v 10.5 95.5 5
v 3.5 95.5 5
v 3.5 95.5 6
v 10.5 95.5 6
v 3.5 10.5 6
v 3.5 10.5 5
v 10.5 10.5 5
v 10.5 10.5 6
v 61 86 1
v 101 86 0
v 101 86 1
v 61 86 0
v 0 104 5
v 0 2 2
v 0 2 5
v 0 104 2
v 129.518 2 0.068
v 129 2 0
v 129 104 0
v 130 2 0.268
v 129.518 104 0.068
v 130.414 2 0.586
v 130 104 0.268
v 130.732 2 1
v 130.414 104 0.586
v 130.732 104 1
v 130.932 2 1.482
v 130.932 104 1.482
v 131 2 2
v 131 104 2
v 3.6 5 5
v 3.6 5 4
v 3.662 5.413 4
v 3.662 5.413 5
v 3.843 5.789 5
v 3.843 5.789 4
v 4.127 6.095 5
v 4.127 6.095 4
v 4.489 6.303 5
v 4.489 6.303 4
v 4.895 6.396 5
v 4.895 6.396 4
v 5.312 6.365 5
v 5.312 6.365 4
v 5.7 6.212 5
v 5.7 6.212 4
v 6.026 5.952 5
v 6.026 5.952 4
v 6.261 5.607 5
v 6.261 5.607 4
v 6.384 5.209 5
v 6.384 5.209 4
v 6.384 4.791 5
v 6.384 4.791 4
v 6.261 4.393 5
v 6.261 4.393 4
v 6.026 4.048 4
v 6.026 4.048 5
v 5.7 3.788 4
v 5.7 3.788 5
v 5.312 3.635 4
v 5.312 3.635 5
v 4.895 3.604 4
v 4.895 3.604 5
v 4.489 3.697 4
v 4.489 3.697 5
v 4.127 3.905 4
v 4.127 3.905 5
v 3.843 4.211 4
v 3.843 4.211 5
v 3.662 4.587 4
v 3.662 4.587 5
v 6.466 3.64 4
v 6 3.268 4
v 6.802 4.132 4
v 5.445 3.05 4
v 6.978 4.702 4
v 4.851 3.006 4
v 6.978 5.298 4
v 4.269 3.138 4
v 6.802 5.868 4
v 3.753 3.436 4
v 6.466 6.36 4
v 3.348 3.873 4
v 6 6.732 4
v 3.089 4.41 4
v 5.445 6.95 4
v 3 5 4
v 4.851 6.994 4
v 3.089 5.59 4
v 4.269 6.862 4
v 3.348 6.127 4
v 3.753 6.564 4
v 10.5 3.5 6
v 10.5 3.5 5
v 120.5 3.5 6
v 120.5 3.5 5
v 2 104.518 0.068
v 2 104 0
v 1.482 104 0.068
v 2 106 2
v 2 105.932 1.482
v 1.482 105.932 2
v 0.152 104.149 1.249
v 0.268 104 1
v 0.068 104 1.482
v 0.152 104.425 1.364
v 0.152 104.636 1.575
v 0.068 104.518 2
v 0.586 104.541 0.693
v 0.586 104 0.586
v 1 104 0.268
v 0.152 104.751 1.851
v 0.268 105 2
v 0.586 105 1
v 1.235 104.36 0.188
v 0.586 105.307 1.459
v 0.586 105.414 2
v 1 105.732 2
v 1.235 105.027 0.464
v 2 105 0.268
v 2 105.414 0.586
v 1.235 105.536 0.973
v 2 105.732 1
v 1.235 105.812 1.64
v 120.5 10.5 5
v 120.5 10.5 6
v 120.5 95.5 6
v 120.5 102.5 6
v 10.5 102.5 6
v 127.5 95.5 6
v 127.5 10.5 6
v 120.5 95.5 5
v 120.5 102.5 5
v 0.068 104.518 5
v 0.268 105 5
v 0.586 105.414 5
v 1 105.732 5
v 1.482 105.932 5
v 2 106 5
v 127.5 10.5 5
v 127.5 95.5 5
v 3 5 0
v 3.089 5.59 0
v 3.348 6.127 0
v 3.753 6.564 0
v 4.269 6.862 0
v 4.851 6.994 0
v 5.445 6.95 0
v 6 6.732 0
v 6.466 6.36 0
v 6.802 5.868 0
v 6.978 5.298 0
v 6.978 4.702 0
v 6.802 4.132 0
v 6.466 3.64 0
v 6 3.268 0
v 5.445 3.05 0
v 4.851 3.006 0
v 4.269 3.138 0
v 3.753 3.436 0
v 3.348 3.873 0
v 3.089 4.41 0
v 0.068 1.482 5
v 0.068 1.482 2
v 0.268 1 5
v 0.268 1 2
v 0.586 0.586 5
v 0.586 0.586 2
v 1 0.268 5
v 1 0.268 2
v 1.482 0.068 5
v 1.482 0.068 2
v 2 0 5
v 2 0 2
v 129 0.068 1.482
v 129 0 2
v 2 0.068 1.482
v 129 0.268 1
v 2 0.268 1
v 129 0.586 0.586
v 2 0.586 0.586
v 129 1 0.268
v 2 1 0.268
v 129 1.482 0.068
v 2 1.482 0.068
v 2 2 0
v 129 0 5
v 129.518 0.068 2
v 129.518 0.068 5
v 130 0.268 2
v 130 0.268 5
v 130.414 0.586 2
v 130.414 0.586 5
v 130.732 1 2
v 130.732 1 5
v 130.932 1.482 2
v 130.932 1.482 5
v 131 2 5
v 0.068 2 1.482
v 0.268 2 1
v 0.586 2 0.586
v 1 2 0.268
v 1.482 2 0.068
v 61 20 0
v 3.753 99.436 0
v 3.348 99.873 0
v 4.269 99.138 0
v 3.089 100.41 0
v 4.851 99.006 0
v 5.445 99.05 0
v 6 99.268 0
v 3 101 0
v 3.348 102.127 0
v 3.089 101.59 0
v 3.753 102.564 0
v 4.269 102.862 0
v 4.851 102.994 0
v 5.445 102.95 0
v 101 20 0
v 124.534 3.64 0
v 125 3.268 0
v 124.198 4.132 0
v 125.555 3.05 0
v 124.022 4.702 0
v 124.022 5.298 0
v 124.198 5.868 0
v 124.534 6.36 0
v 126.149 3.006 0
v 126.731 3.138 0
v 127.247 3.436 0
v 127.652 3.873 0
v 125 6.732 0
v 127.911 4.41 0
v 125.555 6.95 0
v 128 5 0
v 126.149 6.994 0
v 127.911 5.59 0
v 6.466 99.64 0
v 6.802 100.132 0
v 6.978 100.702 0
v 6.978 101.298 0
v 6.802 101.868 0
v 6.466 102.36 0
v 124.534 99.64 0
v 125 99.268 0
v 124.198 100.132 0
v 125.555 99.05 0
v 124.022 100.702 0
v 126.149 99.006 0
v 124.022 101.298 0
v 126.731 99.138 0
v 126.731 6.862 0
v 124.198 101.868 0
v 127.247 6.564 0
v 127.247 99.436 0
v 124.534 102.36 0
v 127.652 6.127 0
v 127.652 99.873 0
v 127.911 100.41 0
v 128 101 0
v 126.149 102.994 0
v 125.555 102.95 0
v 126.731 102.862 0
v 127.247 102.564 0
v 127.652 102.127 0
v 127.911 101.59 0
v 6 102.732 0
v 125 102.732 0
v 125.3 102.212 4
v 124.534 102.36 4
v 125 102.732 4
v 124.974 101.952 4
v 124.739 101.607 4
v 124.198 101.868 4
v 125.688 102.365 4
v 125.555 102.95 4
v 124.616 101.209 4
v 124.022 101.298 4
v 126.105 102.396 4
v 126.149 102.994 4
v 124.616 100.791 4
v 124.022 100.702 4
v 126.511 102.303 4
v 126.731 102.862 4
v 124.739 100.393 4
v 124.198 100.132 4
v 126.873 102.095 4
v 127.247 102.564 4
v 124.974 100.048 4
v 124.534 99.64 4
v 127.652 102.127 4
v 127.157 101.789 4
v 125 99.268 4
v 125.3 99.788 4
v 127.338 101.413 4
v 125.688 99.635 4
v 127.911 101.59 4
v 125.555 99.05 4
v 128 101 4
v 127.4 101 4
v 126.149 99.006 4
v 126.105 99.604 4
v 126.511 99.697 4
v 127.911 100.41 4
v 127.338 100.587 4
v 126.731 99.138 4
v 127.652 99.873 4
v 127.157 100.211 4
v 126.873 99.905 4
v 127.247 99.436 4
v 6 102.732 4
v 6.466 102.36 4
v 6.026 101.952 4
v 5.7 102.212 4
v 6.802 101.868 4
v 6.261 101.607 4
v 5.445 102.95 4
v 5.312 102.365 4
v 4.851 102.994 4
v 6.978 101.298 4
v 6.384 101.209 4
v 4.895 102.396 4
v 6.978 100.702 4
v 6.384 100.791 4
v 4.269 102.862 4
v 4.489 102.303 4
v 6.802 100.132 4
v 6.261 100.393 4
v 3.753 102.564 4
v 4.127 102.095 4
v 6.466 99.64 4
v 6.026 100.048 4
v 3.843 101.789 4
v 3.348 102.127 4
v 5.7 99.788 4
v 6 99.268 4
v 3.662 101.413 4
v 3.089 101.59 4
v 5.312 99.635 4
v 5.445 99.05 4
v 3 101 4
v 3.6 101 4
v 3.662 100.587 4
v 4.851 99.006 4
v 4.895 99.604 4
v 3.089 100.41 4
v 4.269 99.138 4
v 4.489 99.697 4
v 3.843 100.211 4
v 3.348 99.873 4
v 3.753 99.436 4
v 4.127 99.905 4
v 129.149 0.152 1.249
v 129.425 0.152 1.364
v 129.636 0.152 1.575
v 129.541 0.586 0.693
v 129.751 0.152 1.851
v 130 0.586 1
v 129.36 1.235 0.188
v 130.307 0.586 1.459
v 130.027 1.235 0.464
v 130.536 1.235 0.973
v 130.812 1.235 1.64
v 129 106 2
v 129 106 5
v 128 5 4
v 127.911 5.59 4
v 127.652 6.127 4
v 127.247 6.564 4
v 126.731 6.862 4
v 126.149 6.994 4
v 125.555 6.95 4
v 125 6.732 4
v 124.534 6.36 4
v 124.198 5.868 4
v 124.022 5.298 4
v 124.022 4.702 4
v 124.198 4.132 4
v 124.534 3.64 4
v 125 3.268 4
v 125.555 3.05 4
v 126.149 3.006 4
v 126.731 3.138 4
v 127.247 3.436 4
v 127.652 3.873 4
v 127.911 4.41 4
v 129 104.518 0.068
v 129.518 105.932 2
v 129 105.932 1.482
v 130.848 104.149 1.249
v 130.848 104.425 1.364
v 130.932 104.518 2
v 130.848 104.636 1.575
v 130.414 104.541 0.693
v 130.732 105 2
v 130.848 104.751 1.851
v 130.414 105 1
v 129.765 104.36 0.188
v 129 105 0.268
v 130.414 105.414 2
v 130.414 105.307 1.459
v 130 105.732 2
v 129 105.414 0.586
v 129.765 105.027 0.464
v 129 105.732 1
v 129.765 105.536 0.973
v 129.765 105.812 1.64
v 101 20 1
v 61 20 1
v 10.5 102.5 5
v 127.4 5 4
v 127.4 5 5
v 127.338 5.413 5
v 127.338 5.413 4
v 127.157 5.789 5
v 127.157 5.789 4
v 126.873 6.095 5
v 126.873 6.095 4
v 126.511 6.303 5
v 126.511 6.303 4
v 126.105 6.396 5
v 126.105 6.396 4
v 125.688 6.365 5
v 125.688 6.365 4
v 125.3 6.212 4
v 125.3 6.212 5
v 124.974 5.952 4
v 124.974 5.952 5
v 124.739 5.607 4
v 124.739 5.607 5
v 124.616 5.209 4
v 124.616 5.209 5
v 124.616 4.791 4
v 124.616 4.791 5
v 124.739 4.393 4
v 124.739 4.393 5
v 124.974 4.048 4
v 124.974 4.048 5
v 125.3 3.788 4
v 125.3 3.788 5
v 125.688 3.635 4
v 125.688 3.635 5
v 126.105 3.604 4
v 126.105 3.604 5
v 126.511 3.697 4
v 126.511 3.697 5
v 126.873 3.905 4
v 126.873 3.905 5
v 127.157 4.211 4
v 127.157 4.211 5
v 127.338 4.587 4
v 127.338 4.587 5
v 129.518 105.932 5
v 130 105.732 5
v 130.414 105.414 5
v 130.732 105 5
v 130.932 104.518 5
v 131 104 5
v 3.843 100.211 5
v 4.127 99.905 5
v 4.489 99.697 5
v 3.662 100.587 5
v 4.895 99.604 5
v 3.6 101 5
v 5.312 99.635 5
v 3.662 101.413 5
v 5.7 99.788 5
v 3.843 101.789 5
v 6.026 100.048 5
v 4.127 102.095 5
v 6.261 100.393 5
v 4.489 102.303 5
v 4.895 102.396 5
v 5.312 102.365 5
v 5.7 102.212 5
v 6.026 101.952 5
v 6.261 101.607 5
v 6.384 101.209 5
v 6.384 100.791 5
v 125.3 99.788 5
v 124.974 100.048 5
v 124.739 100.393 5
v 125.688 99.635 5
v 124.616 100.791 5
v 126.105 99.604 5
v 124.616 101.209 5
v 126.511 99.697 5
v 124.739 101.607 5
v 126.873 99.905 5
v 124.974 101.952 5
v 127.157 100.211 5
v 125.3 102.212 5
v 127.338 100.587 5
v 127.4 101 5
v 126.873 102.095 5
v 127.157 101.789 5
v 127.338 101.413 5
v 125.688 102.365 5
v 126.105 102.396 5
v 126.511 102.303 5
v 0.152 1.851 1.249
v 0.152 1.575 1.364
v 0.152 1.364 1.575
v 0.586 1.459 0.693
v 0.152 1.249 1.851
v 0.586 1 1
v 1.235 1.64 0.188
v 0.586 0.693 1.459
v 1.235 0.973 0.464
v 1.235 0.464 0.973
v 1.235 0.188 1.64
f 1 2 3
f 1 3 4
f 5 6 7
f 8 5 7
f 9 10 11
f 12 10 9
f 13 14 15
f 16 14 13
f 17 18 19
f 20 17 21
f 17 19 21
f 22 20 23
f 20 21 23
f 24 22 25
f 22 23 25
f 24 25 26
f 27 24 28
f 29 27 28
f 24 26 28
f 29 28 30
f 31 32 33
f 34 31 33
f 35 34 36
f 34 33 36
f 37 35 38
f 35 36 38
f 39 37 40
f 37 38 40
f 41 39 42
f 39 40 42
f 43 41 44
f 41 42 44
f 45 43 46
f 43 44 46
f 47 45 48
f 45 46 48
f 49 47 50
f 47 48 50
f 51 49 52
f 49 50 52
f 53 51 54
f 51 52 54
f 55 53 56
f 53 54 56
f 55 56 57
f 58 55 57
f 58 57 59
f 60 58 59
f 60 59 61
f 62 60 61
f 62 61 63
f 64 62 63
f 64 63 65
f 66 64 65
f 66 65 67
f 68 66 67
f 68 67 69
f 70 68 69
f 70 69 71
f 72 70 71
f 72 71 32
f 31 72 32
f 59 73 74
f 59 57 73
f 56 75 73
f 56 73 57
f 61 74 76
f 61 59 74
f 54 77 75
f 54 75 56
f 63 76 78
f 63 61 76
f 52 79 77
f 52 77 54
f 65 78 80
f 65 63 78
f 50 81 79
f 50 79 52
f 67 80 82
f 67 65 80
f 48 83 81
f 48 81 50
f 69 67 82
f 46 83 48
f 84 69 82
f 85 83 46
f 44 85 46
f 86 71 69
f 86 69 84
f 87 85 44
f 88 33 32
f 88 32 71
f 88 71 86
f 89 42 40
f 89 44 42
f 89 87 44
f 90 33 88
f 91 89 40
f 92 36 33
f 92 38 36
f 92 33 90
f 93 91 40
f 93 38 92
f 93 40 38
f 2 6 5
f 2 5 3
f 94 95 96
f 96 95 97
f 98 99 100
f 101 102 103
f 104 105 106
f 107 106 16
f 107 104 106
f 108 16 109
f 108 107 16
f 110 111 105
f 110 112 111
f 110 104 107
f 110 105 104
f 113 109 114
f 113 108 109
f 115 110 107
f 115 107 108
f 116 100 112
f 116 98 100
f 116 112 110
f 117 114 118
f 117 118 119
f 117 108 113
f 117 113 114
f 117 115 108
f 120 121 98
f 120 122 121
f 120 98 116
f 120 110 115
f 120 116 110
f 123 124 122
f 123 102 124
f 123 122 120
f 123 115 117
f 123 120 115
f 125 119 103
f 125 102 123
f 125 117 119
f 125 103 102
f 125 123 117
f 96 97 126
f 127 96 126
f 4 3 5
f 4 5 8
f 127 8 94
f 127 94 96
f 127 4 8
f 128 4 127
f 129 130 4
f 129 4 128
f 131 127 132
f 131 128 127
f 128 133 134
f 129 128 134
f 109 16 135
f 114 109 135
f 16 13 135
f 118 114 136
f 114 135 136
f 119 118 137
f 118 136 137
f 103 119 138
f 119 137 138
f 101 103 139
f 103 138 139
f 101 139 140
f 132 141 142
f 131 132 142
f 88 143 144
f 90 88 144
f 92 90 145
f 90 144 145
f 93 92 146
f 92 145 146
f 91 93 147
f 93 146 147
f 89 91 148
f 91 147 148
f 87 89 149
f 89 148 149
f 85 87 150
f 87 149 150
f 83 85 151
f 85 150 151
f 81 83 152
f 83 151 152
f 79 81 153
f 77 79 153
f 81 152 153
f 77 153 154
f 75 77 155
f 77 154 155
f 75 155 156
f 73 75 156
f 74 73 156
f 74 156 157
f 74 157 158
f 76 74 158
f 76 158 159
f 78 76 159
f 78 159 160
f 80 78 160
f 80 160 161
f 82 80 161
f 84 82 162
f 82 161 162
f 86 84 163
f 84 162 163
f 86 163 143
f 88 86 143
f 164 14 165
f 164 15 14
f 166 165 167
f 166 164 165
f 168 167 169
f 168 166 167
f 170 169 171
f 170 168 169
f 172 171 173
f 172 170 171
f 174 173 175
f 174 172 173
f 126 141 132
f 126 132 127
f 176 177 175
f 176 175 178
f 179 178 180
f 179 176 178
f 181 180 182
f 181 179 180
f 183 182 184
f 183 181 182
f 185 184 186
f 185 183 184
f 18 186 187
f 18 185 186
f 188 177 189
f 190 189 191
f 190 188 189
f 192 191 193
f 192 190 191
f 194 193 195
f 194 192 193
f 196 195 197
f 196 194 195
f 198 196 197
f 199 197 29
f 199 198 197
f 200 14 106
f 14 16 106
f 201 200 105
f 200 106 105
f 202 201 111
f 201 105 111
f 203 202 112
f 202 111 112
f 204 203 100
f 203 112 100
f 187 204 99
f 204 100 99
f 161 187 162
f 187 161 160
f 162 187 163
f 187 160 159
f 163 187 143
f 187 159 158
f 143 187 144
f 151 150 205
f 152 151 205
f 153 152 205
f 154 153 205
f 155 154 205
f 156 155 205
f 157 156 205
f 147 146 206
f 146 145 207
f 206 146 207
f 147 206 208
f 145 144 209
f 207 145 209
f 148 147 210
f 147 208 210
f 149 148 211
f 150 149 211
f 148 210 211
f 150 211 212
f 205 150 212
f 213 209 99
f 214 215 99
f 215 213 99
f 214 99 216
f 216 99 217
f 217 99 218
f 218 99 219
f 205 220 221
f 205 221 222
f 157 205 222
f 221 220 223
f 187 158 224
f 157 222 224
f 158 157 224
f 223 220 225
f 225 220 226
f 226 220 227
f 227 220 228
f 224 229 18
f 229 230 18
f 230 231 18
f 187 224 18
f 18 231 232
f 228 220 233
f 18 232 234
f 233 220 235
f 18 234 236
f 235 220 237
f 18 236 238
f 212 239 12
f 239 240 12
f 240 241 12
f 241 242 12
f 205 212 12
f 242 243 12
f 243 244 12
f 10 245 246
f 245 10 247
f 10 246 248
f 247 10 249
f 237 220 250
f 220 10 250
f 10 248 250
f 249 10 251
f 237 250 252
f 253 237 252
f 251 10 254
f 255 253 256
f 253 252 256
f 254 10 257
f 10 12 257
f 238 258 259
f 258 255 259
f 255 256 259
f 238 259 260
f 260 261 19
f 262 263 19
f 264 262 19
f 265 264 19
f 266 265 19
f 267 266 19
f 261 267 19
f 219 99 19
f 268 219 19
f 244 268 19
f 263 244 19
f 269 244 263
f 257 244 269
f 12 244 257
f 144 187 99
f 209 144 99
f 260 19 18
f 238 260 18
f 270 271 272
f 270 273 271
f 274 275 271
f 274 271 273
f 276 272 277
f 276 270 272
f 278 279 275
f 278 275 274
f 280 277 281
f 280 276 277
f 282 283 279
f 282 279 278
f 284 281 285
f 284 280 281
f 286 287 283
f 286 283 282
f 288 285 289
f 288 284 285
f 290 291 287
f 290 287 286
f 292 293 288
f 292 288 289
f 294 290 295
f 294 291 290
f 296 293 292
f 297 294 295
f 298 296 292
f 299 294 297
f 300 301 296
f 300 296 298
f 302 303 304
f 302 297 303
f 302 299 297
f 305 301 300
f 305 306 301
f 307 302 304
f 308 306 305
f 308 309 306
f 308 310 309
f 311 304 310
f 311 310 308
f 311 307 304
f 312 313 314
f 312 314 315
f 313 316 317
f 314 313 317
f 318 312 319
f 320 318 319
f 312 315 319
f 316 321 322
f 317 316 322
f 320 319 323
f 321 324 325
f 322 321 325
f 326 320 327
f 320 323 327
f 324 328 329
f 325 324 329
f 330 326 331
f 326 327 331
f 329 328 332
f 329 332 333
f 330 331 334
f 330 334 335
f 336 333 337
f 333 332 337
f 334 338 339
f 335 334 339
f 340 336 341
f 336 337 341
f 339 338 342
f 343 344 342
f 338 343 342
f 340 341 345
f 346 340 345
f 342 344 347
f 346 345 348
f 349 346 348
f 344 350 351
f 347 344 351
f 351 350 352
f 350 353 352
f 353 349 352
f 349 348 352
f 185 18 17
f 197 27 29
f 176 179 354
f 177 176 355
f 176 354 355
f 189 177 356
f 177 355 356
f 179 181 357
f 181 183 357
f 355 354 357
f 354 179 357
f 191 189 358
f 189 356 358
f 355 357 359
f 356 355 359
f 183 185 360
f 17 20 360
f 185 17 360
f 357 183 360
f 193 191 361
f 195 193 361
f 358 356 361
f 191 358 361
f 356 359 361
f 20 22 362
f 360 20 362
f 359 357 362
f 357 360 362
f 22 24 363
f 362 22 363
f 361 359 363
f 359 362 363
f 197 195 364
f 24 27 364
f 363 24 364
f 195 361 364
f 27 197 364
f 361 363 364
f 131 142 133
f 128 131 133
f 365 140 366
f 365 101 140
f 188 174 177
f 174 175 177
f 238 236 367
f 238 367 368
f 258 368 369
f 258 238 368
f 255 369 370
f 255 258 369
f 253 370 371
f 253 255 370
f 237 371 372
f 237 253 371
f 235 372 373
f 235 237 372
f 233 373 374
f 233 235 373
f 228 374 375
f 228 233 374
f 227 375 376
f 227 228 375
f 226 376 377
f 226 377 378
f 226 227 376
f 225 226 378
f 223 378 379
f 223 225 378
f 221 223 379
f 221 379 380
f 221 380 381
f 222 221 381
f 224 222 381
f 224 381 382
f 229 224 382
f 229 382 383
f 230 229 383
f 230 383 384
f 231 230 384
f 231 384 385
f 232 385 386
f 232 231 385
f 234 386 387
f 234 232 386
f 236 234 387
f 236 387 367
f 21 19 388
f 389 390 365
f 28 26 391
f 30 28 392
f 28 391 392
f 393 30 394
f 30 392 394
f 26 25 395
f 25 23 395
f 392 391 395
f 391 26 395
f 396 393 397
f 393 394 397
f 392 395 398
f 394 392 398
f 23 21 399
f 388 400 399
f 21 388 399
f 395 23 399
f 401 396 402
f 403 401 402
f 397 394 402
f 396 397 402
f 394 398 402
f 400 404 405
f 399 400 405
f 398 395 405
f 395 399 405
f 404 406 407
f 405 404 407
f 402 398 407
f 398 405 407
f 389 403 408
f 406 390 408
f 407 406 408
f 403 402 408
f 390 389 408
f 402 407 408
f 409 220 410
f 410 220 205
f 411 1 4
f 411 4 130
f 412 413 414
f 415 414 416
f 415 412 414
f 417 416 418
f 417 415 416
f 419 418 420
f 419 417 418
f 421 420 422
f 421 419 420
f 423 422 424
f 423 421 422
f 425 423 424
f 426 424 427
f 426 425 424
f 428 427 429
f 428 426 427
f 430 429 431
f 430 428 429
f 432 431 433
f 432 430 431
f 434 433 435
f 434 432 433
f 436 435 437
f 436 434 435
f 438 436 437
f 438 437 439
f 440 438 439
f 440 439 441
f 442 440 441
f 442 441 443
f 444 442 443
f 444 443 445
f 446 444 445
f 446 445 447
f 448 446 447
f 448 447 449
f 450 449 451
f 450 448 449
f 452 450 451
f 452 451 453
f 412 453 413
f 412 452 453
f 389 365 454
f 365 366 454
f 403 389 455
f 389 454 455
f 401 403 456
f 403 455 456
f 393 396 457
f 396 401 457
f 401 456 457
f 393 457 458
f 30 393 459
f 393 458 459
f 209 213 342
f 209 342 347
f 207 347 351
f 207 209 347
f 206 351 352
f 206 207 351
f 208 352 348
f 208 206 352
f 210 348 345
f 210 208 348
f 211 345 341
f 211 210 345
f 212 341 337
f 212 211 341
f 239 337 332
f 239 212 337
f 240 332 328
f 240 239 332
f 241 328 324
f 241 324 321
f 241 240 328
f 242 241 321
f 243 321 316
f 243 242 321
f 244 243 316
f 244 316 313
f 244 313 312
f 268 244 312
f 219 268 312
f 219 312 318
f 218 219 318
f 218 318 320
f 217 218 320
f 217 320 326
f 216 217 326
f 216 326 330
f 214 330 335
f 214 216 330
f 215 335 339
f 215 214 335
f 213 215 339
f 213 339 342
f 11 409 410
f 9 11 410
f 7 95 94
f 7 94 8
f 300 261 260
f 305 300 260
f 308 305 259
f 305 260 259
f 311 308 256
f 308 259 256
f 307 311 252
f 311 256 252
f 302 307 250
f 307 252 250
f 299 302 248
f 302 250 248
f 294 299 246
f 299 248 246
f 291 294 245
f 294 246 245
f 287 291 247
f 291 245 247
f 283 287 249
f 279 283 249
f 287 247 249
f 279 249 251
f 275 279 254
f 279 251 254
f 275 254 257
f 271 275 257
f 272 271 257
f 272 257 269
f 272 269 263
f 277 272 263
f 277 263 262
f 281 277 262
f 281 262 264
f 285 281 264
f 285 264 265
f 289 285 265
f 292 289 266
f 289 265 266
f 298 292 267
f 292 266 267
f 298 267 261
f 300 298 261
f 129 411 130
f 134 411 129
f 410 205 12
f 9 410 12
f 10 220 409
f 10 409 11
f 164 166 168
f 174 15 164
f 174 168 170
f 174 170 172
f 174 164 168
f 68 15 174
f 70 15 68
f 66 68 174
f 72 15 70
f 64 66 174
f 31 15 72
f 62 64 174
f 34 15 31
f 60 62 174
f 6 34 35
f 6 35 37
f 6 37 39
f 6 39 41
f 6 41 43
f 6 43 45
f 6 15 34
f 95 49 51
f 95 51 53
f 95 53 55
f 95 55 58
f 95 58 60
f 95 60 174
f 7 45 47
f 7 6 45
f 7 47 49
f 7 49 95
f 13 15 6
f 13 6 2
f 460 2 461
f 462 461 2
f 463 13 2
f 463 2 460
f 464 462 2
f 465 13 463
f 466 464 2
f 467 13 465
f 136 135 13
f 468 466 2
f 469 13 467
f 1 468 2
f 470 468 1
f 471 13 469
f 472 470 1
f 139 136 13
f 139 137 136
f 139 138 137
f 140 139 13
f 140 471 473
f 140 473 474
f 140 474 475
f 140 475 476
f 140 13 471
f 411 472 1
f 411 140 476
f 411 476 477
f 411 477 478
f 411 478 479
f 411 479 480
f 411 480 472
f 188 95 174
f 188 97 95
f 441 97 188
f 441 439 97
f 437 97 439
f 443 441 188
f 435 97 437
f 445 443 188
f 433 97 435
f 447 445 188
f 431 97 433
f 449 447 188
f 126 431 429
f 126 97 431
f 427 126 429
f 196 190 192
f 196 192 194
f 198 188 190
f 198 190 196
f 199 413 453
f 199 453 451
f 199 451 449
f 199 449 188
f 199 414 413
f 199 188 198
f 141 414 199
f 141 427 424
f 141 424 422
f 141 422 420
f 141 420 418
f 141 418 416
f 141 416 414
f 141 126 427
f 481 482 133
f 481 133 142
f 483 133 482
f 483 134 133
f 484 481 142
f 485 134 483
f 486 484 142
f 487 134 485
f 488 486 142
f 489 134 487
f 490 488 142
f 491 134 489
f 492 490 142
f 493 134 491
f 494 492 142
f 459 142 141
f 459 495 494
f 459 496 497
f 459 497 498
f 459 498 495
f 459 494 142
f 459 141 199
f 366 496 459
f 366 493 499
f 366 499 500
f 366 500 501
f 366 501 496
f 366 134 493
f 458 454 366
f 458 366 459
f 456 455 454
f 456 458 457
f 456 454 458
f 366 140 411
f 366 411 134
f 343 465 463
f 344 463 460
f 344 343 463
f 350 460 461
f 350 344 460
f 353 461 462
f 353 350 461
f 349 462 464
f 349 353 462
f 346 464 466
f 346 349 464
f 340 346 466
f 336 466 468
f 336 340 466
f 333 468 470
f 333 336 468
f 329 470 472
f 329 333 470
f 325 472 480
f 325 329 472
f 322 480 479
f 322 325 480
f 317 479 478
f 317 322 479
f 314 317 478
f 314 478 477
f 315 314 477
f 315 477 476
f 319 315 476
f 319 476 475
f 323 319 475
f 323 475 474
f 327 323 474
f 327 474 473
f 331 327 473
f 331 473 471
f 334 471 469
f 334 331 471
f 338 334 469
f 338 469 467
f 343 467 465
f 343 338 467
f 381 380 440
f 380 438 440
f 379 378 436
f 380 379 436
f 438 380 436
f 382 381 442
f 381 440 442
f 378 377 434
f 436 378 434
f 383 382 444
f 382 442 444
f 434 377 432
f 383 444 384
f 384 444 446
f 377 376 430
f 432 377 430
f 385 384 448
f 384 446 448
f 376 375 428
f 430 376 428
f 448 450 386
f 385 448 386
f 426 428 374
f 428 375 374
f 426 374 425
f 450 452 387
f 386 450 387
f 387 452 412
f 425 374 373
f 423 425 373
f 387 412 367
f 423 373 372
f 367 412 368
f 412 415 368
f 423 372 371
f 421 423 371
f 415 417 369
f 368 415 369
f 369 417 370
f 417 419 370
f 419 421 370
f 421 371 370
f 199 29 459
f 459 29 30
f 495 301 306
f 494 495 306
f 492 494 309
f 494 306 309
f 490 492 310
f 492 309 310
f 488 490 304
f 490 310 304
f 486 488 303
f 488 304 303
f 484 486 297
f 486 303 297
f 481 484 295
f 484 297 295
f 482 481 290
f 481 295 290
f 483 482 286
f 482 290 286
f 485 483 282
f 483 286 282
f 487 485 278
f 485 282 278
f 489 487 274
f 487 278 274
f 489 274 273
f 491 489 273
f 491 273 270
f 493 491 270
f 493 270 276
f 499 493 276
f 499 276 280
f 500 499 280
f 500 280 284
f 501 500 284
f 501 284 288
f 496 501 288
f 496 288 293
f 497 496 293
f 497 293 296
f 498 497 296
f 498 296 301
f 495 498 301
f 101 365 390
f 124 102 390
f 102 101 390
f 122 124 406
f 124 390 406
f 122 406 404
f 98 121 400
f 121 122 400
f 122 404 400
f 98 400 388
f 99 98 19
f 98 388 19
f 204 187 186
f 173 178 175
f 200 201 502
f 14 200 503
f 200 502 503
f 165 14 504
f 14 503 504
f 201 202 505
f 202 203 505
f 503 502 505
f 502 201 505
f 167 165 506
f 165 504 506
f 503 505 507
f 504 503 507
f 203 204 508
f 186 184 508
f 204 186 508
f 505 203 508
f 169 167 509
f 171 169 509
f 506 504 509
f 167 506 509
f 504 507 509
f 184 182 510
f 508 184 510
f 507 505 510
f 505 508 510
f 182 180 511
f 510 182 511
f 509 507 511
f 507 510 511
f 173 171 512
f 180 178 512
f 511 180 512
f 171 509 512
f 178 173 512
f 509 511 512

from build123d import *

# Parameters (mm, degrees)
SKETCH1_W               = 131
SKETCH1_H               = 106
BOSS_EXTRUDE1_DEPTH     = 5
SKETCH6_R               = 2
CUT_EXTRUDE1_DEPTH      = 4
SKETCH7_R               = 1.4
CUT_EXTRUDE2_DEPTH      = 2.8
MIRROR2_COPY_1_SKETCH_R = 2
MIRROR2_COPY_1_DEPTH    = 4
MIRROR2_COPY_2_SKETCH_R = 1.4
MIRROR2_COPY_2_DEPTH    = 2.8
SKETCH10_W              = 40
SKETCH10_H              = 66
CUT_EXTRUDE5_DEPTH      = 1
FILLET1_R               = 2
SKETCH8_W               = 110
SKETCH8_H               = 99
BOSS_EXTRUDE2_DEPTH     = 1
SKETCH11_W              = 7
SKETCH11_H              = 85
BOSS_EXTRUDE3_DEPTH     = 1


with BuildPart() as part:
    # Sketch1 → Boss-Extrude1 (new body)
    with BuildSketch(Plane.XY):
        with Locations((65.5, 53)):
            Rectangle(SKETCH1_W, SKETCH1_H)
    extrude(amount=BOSS_EXTRUDE1_DEPTH)

    # Sketch6 → Cut-Extrude1 (cut)
    with BuildSketch(Plane(origin=(0, 0, 0), x_dir=(-1, 0, 0), z_dir=(0, 0, -1))):
        with Locations((-5, 5)):
            Circle(SKETCH6_R)
    cut_extrude1 = extrude(amount=-CUT_EXTRUDE1_DEPTH, mode=Mode.SUBTRACT)

    # Sketch7 → Cut-Extrude2 (cut)
    with BuildSketch(Plane(origin=(0, 0, 4), x_dir=(-1, 0, 0), z_dir=(0, 0, -1))):
        with Locations((-5, 5)):
            Circle(SKETCH7_R)
    cut_extrude2 = extrude(amount=-CUT_EXTRUDE2_DEPTH, mode=Mode.SUBTRACT)

    # Mirror1: Cut-Extrude1, Cut-Extrude2 across plane
    add(cut_extrude1.mirror(Plane.ZY.offset(-65.5)), mode=Mode.SUBTRACT)
    add(cut_extrude2.mirror(Plane.ZY.offset(-65.5)), mode=Mode.SUBTRACT)

    # Mirror2: Cut-Extrude1, Cut-Extrude2 across plane
    add(cut_extrude1.mirror(Plane(origin=(0, 53, 0), x_dir=(0, 0, 1), z_dir=(0, -1, 0))), mode=Mode.SUBTRACT)
    add(cut_extrude2.mirror(Plane(origin=(0, 53, 0), x_dir=(0, 0, 1), z_dir=(0, -1, 0))), mode=Mode.SUBTRACT)

    # Mirror2 copy 1 sketch → Mirror2 copy 1 (cut)
    with BuildSketch(Plane(origin=(131, 106, 0), x_dir=(1, 0, 0), z_dir=(0, 0, -1))):
        with Locations((-5, 5)):
            Circle(MIRROR2_COPY_1_SKETCH_R)
    extrude(amount=-MIRROR2_COPY_1_DEPTH, mode=Mode.SUBTRACT)

    # Mirror2 copy 2 sketch → Mirror2 copy 2 (cut)
    with BuildSketch(Plane(origin=(131, 106, 4), x_dir=(1, 0, 0), z_dir=(0, 0, -1))):
        with Locations((-5, 5)):
            Circle(MIRROR2_COPY_2_SKETCH_R)
    extrude(amount=-MIRROR2_COPY_2_DEPTH, mode=Mode.SUBTRACT)

    # Sketch10 → Cut-Extrude5 (cut)
    with BuildSketch(Plane(origin=(0, 0, 0), x_dir=(-1, 0, 0), z_dir=(0, 0, -1))):
        with Locations((-81, 53)):
            Rectangle(SKETCH10_W, SKETCH10_H)
    extrude(amount=-CUT_EXTRUDE5_DEPTH, mode=Mode.SUBTRACT)

    # Fillet1
    fillet1_edges = [part.edges().sort_by_distance(p)[0] for p in [
        (65.5, 106, 0),
        (131, 53, 0),
        (65.5, 0, 0),
        (0, 53, 0),
        (0, 106, 2.5),
        (131, 106, 2.5),
        (131, 0, 2.5),
        (0, 0, 2.5),
    ]]
    fillet(fillet1_edges, radius=FILLET1_R)

    # Sketch8 → Boss-Extrude2 (add)
    with BuildSketch(Plane.XY.offset(5)):
        with Locations((65.5, 53)):
            Rectangle(SKETCH8_W, SKETCH8_H)
    extrude(amount=BOSS_EXTRUDE2_DEPTH)

    # Sketch11 → Boss-Extrude3 (add)
    with BuildSketch(Plane.XY.offset(5)):
        with Locations((7, 53)):
            Rectangle(SKETCH11_W, SKETCH11_H)
    boss_extrude3 = extrude(amount=BOSS_EXTRUDE3_DEPTH)

    # Mirror3: Boss-Extrude3 across plane
    add(boss_extrude3.mirror(Plane.ZY.offset(-65.5)))


solid = part.part
